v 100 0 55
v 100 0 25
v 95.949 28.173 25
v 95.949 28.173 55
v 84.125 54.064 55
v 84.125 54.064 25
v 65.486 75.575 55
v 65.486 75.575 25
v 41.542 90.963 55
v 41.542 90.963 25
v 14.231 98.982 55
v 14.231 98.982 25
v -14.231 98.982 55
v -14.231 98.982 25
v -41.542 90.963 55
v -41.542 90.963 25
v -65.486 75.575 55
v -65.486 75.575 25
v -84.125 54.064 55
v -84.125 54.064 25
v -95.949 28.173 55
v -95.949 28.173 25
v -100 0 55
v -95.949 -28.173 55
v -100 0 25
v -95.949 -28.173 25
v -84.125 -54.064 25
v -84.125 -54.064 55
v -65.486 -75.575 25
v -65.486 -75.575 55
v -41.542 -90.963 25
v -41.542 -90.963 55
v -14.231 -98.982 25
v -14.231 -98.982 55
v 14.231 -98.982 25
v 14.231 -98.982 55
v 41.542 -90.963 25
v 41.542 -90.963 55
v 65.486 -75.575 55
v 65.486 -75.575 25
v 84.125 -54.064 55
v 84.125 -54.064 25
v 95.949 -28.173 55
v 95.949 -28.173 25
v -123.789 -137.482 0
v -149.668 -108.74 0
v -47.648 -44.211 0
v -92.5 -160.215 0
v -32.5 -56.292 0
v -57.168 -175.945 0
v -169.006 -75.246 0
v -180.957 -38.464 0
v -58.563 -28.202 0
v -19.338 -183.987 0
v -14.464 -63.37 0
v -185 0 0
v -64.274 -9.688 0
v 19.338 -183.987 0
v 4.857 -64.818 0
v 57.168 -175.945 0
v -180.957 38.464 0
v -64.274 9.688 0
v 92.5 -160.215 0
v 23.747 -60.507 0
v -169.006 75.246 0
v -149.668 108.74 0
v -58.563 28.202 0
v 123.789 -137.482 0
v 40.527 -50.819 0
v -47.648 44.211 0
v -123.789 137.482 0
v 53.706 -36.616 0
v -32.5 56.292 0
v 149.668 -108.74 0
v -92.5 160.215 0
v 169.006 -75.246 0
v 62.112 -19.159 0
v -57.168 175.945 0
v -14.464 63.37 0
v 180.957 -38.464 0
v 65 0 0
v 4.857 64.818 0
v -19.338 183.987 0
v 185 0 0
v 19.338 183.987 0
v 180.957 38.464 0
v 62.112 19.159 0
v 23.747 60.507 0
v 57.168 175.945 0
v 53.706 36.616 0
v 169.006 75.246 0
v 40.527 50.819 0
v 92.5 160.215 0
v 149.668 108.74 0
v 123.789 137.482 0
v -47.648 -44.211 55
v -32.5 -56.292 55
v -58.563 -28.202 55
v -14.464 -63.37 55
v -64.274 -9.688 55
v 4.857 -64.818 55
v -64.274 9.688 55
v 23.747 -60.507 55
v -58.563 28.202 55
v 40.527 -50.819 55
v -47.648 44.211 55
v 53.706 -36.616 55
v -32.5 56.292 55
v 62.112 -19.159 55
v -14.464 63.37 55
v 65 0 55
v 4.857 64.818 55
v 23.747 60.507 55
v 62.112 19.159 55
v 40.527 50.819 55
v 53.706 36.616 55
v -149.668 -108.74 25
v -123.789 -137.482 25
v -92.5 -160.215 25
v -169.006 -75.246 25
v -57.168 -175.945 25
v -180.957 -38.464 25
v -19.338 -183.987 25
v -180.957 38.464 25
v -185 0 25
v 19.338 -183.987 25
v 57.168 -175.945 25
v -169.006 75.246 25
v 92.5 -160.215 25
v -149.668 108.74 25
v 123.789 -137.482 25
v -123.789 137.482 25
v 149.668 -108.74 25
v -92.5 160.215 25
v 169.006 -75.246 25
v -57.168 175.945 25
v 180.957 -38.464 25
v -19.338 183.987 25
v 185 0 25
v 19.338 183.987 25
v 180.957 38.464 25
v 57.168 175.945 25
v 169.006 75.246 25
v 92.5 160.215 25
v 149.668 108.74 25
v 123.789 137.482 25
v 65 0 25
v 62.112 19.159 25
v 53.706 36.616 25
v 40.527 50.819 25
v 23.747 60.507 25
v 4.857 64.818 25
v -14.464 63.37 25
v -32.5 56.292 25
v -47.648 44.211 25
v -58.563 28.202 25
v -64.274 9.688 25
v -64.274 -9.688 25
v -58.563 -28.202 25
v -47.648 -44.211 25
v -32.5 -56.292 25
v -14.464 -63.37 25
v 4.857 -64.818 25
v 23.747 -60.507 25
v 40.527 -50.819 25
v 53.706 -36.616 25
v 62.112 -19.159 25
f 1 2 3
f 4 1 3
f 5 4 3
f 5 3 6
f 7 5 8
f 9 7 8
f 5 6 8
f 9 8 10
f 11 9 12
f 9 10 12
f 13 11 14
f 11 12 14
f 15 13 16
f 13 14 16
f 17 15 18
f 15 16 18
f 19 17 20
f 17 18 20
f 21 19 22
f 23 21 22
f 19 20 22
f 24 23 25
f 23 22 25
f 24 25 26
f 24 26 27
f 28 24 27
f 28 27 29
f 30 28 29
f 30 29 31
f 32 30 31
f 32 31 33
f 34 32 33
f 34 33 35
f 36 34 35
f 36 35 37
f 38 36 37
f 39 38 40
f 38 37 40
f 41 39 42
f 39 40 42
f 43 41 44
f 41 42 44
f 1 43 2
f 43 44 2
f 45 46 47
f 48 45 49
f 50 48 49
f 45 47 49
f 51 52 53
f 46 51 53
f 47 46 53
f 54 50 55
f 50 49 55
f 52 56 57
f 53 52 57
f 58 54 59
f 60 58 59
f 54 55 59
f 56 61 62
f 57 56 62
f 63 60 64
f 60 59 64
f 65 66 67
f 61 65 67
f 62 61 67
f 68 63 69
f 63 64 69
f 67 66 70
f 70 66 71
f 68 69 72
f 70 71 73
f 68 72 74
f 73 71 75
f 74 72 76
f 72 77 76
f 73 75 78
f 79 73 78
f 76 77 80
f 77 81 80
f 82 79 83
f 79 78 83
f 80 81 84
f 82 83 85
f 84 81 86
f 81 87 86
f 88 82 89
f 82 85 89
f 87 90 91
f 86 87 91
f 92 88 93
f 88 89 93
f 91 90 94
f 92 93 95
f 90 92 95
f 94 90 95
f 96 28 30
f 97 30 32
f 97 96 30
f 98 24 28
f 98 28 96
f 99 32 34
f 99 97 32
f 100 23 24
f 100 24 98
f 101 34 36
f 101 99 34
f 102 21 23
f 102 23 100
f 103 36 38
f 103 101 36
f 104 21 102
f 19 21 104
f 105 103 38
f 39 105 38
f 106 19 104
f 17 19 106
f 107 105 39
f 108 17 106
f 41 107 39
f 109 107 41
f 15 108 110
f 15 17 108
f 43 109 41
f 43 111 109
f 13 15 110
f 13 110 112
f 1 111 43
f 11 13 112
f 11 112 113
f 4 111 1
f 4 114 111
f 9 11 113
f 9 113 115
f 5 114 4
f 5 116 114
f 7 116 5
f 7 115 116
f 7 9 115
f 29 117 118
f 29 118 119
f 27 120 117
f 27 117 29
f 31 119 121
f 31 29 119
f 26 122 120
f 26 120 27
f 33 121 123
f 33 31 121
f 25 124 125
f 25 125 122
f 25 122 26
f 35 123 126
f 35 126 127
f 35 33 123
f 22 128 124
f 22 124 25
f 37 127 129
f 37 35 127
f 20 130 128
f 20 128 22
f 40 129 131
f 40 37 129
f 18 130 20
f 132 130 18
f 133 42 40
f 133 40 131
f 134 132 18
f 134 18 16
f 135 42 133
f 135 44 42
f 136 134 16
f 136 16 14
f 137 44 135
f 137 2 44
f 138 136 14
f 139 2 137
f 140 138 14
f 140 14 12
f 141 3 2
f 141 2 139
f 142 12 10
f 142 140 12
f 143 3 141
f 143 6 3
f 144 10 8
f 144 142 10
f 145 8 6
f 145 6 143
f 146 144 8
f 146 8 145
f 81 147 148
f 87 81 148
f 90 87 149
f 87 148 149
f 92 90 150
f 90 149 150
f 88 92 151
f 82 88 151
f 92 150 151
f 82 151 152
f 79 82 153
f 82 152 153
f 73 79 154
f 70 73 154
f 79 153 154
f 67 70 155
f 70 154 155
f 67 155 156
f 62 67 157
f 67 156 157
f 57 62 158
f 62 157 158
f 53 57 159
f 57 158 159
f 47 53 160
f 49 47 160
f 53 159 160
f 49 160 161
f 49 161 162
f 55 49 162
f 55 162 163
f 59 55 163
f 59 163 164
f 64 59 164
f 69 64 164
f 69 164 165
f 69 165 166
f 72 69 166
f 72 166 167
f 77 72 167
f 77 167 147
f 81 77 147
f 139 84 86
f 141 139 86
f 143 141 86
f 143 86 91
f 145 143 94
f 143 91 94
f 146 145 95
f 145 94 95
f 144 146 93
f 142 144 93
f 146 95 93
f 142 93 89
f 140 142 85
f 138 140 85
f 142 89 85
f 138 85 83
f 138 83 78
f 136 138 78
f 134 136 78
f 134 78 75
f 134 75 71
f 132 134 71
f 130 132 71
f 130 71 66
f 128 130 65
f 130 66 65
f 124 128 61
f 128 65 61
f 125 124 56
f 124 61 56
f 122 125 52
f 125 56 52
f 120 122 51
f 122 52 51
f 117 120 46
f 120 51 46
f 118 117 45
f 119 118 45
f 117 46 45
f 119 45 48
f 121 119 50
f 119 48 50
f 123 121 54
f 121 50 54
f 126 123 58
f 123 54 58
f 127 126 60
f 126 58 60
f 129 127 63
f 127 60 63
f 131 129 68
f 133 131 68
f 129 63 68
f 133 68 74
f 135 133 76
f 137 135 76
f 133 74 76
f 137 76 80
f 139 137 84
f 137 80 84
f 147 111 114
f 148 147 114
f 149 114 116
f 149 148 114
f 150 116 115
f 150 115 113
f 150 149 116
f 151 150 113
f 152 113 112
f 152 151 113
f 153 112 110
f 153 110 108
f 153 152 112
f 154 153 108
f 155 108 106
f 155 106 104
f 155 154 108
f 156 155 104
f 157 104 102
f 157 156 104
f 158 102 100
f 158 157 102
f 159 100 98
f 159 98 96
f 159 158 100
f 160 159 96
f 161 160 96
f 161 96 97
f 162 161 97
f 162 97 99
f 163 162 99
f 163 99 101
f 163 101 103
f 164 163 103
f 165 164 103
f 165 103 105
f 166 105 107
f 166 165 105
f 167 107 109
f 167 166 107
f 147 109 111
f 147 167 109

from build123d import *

# Parameters (mm, degrees)
F0_R      = 185
F1_DEPTH  = 25
F2_R      = 100
F2_R_2    = 65
F3_DEPTH  = 30
F3_FACE_R = 65
F4_DEPTH  = 25.001


with BuildPart() as f1:
    # F0 (on Top) → F1 (new body)
    with BuildSketch(Plane.XY):
        Circle(F0_R)
    extrude(amount=F1_DEPTH)

    # F2 (on face) → F3 (join)
    with BuildSketch(Plane.XY.offset(25)):
        Circle(F2_R)
        Circle(F2_R_2, mode=Mode.SUBTRACT)
    extrude(amount=F3_DEPTH)

    # F3_face (on face) → F4 (cut, through all)
    with BuildSketch(Plane.XY.offset(25)):
        Circle(F3_FACE_R)
    extrude(amount=-F4_DEPTH, mode=Mode.SUBTRACT)


solid = f1.part
